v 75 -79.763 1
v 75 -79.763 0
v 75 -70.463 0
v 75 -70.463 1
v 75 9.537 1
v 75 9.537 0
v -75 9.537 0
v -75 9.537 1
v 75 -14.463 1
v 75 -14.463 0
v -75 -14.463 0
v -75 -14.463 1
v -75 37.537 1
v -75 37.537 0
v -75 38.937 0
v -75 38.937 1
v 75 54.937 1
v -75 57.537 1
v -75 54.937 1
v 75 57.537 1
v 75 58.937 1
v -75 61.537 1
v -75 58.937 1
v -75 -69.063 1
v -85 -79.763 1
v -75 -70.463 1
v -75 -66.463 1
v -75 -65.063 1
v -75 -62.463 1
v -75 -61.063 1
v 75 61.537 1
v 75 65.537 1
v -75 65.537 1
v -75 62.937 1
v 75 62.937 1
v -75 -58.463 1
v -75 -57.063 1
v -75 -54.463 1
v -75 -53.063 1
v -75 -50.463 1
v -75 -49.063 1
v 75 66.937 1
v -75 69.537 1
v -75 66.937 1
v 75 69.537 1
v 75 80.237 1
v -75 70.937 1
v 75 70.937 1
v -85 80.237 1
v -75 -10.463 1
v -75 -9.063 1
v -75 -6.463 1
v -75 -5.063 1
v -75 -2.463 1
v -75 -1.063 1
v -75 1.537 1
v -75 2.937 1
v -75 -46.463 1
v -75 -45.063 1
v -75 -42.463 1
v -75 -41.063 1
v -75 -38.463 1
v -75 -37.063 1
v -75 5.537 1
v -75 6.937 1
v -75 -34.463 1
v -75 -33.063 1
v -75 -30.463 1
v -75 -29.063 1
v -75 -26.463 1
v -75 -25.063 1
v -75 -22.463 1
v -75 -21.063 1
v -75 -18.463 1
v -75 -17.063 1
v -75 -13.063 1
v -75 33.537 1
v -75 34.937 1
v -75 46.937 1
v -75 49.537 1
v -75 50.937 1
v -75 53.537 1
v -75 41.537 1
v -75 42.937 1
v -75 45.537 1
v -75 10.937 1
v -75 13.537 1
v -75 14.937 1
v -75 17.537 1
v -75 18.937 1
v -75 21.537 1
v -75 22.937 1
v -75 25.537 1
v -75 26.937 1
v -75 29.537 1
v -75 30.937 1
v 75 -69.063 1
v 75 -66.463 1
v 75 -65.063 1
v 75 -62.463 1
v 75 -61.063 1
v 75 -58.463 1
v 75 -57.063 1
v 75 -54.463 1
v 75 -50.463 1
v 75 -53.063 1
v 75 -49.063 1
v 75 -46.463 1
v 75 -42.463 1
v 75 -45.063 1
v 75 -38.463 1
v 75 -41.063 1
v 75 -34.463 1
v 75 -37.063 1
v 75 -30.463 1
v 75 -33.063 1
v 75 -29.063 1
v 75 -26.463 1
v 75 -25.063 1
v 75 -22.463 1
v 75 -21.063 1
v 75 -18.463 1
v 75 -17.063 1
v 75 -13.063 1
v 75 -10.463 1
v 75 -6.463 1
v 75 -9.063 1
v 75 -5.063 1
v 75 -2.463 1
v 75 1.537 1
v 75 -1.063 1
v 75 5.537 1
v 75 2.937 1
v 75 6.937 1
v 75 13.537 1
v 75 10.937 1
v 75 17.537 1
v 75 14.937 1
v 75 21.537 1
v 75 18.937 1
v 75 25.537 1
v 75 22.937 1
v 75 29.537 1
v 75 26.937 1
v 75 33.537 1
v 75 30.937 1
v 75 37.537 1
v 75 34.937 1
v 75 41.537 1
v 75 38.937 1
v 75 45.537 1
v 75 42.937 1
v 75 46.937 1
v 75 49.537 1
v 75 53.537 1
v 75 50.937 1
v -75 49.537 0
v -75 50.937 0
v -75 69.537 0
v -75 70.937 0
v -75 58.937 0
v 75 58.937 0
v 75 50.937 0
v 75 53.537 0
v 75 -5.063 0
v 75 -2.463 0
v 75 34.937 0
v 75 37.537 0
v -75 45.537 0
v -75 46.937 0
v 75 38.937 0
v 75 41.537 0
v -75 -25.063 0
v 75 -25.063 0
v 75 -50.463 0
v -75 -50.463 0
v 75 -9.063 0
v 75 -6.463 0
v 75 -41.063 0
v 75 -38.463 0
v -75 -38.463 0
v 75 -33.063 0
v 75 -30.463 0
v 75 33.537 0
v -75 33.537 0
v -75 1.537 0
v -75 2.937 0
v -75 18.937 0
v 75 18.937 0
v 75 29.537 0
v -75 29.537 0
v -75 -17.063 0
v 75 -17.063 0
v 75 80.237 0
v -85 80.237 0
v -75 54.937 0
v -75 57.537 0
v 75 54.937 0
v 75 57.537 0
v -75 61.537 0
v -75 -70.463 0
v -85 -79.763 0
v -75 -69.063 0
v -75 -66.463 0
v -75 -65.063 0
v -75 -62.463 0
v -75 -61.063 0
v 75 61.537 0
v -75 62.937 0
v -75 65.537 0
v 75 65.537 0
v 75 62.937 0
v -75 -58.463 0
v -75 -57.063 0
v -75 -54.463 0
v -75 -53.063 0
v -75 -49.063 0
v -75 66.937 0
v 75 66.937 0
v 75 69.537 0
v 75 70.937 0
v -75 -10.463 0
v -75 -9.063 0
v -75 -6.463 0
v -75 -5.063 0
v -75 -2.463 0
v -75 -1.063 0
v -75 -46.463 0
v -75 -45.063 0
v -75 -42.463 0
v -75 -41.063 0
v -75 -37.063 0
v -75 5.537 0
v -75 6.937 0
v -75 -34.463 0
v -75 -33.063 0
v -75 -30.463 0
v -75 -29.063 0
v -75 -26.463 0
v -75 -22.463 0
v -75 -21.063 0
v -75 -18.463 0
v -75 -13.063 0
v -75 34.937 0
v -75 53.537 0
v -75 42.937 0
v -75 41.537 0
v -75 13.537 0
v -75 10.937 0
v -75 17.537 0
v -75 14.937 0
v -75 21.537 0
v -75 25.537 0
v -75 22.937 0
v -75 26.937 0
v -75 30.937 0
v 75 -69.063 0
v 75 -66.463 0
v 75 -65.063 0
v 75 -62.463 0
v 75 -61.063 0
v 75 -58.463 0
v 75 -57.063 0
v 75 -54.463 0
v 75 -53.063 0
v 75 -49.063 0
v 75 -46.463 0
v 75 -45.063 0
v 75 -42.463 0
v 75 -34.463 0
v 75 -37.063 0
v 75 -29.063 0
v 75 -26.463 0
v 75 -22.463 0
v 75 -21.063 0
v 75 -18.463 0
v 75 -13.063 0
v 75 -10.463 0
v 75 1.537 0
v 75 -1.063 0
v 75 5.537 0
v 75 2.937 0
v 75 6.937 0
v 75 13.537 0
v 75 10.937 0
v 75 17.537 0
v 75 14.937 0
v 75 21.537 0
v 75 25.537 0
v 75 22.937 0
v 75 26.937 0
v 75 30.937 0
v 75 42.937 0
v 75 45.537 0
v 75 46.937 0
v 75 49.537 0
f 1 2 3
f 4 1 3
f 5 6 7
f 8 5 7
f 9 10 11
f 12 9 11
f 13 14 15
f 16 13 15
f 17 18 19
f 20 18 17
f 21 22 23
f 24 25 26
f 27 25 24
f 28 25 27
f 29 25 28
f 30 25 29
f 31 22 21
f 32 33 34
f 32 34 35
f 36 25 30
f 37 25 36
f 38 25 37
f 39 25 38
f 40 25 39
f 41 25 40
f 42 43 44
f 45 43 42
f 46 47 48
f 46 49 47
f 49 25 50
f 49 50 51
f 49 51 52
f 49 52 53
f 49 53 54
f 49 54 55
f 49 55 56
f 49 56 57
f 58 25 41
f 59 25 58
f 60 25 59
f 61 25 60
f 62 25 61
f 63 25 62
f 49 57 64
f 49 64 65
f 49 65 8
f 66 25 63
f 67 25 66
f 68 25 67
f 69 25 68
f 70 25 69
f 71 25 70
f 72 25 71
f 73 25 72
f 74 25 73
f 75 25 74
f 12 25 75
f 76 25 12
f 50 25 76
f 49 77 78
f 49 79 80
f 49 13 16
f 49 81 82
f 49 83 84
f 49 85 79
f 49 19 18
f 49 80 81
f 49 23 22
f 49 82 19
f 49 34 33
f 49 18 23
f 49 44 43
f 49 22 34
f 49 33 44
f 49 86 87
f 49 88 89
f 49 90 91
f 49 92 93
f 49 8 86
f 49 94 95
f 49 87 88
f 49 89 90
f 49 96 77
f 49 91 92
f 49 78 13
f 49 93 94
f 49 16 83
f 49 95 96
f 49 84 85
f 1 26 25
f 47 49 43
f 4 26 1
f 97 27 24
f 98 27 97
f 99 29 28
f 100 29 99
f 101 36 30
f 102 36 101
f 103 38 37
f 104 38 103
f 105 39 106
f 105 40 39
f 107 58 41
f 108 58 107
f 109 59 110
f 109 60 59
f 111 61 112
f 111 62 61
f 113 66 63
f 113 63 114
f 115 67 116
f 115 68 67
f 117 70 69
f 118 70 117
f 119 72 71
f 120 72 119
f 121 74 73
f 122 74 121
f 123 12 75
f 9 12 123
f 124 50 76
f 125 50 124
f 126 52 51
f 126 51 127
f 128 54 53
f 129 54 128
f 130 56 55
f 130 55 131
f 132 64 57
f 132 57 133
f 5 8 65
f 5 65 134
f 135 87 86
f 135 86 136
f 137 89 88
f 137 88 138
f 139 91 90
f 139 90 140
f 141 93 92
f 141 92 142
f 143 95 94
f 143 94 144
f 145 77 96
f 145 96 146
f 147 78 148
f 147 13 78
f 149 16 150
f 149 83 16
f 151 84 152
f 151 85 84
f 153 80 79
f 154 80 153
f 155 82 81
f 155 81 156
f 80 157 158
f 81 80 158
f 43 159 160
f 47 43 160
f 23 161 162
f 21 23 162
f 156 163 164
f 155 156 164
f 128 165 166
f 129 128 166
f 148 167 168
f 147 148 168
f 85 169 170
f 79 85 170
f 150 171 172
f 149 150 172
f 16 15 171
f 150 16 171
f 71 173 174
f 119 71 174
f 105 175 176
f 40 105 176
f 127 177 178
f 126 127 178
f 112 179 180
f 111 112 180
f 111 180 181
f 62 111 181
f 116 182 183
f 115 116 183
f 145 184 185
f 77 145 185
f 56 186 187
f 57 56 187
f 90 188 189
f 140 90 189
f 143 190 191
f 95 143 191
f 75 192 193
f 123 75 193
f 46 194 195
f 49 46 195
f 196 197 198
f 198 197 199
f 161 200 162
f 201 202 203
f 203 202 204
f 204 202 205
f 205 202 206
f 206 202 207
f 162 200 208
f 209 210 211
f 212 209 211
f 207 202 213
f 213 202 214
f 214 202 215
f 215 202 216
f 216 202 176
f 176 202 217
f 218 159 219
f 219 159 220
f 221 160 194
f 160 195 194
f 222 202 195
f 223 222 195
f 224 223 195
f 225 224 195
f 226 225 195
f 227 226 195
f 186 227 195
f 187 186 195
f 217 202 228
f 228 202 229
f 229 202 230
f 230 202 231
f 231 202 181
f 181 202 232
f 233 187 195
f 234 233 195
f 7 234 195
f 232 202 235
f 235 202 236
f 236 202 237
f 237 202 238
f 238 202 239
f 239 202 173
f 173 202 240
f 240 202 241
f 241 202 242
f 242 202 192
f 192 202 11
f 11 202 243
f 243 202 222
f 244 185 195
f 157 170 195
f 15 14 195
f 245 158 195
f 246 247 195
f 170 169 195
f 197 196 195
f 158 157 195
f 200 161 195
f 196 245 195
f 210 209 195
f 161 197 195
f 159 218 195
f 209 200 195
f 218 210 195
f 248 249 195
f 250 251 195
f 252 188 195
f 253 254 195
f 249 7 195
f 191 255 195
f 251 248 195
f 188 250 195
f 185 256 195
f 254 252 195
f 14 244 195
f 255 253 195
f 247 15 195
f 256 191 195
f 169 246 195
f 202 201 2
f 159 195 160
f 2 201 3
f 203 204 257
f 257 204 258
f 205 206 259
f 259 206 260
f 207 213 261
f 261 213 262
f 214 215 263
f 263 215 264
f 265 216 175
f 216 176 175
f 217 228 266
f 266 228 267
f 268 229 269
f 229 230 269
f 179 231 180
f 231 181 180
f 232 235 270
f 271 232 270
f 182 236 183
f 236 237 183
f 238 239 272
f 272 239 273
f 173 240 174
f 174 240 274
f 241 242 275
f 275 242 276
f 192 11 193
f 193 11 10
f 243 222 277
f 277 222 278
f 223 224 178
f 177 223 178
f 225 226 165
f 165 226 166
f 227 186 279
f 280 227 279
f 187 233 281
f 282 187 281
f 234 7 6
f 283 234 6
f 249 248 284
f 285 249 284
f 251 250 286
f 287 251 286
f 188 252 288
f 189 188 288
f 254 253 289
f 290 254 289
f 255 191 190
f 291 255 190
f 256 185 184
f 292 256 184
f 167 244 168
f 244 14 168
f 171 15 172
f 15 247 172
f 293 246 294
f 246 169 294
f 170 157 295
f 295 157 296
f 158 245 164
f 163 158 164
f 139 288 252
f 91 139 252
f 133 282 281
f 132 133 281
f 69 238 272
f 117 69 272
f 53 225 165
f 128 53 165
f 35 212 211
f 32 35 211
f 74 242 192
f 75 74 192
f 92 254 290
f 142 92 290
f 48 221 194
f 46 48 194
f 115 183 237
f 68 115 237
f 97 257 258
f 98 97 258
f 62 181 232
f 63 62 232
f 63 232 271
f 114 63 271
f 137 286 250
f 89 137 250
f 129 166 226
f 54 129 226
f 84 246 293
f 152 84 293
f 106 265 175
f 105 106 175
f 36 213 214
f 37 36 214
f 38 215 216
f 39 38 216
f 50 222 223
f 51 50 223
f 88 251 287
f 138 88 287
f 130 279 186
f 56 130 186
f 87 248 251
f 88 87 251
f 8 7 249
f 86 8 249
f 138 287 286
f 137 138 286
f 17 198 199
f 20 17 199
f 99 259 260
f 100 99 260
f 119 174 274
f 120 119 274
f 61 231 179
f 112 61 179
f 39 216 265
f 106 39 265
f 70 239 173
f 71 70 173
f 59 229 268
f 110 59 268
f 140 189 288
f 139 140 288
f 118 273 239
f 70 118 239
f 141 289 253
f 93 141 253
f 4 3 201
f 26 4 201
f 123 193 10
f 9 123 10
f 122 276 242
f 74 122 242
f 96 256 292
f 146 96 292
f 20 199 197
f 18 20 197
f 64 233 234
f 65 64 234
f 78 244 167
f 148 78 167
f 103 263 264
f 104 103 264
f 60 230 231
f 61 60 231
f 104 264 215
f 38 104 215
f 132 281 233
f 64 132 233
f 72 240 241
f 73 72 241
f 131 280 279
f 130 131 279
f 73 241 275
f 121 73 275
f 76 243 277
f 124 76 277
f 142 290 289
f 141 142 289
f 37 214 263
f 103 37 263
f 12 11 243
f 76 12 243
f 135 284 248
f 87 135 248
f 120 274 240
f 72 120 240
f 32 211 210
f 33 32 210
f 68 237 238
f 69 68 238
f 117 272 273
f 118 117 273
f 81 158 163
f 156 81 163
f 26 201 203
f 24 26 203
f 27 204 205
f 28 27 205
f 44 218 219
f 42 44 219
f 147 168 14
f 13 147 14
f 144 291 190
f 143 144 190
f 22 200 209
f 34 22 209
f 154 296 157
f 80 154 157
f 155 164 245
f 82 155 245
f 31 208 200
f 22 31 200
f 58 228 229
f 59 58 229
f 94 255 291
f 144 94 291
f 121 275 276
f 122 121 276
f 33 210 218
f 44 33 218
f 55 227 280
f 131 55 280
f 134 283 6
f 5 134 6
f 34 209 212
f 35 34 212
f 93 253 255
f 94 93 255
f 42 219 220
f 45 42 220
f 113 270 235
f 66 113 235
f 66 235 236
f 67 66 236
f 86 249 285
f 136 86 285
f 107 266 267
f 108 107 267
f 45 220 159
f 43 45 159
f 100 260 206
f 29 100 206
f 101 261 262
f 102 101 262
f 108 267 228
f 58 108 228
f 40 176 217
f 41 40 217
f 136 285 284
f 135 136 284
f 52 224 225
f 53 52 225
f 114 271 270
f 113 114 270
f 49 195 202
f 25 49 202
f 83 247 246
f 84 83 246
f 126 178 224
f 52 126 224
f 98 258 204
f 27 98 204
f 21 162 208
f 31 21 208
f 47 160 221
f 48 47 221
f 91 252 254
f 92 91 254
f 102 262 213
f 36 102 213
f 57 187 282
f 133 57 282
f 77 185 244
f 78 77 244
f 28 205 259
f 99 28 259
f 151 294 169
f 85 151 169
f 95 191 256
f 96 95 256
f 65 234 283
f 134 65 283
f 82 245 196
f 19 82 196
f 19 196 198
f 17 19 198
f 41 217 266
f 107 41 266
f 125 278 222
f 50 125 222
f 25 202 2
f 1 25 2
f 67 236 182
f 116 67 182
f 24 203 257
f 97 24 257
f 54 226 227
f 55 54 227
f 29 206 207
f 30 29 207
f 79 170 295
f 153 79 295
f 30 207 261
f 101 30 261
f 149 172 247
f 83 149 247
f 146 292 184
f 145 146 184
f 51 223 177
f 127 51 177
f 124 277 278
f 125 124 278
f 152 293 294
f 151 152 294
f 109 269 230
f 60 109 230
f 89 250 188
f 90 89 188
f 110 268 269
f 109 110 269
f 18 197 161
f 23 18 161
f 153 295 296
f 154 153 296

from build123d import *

# Parameters (mm, degrees)
EXTRUDE_1_DEPTH = 1


with BuildPart() as part:
    # 草图1 → 凸台-拉伸1 (new body)
    with BuildSketch(Plane.XY):
        Polygon((-75, -66.463368351), (-75, -65.063368351), (75, -65.063368351), (75, -62.463368351), (-75, -62.463368351), (-75, -61.063368351), (75, -61.063368351), (75, -58.463368351), (-75, -58.463368351), (-75, -57.063368351), (75, -57.063368351), (75, -54.463368351), (-75, -54.463368351), (-75, -53.063368351), (75, -53.063368351), (75, -50.463368351), (-75, -50.463368351), (-75, -49.063368351), (75, -49.063368351), (75, -46.463368351), (-75, -46.463368351), (-75, -45.063368351), (75, -45.063368351), (75, -42.463368351), (-75, -42.463368351), (-75, -41.063368351), (75, -41.063368351), (75, -38.463368351), (-75, -38.463368351), (-75, -37.063368351), (75, -37.063368351), (75, -34.463368351), (-75, -34.463368351), (-75, -33.063368351), (75, -33.063368351), (75, -30.463368351), (-75, -30.463368351), (-75, -29.063368351), (75, -29.063368351), (75, -26.463368351), (-75, -26.463368351), (-75, -25.063368351), (75, -25.063368351), (75, -22.463368351), (-75, -22.463368351), (-75, -21.063368351), (75, -21.063368351), (75, -18.463368351), (-75, -18.463368351), (-75, -17.063368351), (75, -17.063368351), (75, -14.463368351), (-75, -14.463368351), (-75, -13.063368351), (75, -13.063368351), (75, -10.463368351), (-75, -10.463368351), (-75, -9.063368351), (75, -9.063368351), (75, -6.463368351), (-75, -6.463368351), (-75, -5.063368351), (75, -5.063368351), (75, -2.463368351), (-75, -2.463368351), (-75, -1.063368351), (75, -1.063368351), (75, 1.536631649), (-75, 1.536631649), (-75, 2.936631649), (75, 2.936631649), (75, 5.536631649), (-75, 5.536631649), (-75, 6.936631649), (75, 6.936631649), (75, 9.536631649), (-75, 9.536631649), (-75, 10.936631649), (75, 10.936631649), (75, 13.536631649), (-75, 13.536631649), (-75, 14.936631649), (75, 14.936631649), (75, 17.536631649), (-75, 17.536631649), (-75, 18.936631649), (75, 18.936631649), (75, 21.536631649), (-75, 21.536631649), (-75, 22.936631649), (75, 22.936631649), (75, 25.536631649), (-75, 25.536631649), (-75, 26.936631649), (75, 26.936631649), (75, 29.536631649), (-75, 29.536631649), (-75, 30.936631649), (75, 30.936631649), (75, 33.536631649), (-75, 33.536631649), (-75, 34.936631649), (75, 34.936631649), (75, 37.536631649), (-75, 37.536631649), (-75, 38.936631649), (75, 38.936631649), (75, 41.536631649), (-75, 41.536631649), (-75, 42.936631649), (75, 42.936631649), (75, 45.536631649), (-75, 45.536631649), (-75, 46.936631649), (75, 46.936631649), (75, 49.536631649), (-75, 49.536631649), (-75, 50.936631649), (75, 50.936631649), (75, 53.536631649), (-75, 53.536631649), (-75, 54.936631649), (75, 54.936631649), (75, 57.536631649), (-75, 57.536631649), (-75, 58.936631649), (75, 58.936631649), (75, 61.536631649), (-75, 61.536631649), (-75, 62.936631649), (75, 62.936631649), (75, 65.536631649), (-75, 65.536631649), (-75, 66.936631649), (75, 66.936631649), (75, 69.536631649), (-75, 69.536631649), (-75, 70.936631649), (75, 70.936631649), (75, 80.236631649), (-85, 80.236631649), (-85, -79.763368351), (75, -79.763368351), (75, -70.463368351), (-75, -70.463368351), (-75, -69.063368351), (75, -69.063368351), (75, -66.463368351), align=None)
    extrude(amount=EXTRUDE_1_DEPTH)


solid = part.part
